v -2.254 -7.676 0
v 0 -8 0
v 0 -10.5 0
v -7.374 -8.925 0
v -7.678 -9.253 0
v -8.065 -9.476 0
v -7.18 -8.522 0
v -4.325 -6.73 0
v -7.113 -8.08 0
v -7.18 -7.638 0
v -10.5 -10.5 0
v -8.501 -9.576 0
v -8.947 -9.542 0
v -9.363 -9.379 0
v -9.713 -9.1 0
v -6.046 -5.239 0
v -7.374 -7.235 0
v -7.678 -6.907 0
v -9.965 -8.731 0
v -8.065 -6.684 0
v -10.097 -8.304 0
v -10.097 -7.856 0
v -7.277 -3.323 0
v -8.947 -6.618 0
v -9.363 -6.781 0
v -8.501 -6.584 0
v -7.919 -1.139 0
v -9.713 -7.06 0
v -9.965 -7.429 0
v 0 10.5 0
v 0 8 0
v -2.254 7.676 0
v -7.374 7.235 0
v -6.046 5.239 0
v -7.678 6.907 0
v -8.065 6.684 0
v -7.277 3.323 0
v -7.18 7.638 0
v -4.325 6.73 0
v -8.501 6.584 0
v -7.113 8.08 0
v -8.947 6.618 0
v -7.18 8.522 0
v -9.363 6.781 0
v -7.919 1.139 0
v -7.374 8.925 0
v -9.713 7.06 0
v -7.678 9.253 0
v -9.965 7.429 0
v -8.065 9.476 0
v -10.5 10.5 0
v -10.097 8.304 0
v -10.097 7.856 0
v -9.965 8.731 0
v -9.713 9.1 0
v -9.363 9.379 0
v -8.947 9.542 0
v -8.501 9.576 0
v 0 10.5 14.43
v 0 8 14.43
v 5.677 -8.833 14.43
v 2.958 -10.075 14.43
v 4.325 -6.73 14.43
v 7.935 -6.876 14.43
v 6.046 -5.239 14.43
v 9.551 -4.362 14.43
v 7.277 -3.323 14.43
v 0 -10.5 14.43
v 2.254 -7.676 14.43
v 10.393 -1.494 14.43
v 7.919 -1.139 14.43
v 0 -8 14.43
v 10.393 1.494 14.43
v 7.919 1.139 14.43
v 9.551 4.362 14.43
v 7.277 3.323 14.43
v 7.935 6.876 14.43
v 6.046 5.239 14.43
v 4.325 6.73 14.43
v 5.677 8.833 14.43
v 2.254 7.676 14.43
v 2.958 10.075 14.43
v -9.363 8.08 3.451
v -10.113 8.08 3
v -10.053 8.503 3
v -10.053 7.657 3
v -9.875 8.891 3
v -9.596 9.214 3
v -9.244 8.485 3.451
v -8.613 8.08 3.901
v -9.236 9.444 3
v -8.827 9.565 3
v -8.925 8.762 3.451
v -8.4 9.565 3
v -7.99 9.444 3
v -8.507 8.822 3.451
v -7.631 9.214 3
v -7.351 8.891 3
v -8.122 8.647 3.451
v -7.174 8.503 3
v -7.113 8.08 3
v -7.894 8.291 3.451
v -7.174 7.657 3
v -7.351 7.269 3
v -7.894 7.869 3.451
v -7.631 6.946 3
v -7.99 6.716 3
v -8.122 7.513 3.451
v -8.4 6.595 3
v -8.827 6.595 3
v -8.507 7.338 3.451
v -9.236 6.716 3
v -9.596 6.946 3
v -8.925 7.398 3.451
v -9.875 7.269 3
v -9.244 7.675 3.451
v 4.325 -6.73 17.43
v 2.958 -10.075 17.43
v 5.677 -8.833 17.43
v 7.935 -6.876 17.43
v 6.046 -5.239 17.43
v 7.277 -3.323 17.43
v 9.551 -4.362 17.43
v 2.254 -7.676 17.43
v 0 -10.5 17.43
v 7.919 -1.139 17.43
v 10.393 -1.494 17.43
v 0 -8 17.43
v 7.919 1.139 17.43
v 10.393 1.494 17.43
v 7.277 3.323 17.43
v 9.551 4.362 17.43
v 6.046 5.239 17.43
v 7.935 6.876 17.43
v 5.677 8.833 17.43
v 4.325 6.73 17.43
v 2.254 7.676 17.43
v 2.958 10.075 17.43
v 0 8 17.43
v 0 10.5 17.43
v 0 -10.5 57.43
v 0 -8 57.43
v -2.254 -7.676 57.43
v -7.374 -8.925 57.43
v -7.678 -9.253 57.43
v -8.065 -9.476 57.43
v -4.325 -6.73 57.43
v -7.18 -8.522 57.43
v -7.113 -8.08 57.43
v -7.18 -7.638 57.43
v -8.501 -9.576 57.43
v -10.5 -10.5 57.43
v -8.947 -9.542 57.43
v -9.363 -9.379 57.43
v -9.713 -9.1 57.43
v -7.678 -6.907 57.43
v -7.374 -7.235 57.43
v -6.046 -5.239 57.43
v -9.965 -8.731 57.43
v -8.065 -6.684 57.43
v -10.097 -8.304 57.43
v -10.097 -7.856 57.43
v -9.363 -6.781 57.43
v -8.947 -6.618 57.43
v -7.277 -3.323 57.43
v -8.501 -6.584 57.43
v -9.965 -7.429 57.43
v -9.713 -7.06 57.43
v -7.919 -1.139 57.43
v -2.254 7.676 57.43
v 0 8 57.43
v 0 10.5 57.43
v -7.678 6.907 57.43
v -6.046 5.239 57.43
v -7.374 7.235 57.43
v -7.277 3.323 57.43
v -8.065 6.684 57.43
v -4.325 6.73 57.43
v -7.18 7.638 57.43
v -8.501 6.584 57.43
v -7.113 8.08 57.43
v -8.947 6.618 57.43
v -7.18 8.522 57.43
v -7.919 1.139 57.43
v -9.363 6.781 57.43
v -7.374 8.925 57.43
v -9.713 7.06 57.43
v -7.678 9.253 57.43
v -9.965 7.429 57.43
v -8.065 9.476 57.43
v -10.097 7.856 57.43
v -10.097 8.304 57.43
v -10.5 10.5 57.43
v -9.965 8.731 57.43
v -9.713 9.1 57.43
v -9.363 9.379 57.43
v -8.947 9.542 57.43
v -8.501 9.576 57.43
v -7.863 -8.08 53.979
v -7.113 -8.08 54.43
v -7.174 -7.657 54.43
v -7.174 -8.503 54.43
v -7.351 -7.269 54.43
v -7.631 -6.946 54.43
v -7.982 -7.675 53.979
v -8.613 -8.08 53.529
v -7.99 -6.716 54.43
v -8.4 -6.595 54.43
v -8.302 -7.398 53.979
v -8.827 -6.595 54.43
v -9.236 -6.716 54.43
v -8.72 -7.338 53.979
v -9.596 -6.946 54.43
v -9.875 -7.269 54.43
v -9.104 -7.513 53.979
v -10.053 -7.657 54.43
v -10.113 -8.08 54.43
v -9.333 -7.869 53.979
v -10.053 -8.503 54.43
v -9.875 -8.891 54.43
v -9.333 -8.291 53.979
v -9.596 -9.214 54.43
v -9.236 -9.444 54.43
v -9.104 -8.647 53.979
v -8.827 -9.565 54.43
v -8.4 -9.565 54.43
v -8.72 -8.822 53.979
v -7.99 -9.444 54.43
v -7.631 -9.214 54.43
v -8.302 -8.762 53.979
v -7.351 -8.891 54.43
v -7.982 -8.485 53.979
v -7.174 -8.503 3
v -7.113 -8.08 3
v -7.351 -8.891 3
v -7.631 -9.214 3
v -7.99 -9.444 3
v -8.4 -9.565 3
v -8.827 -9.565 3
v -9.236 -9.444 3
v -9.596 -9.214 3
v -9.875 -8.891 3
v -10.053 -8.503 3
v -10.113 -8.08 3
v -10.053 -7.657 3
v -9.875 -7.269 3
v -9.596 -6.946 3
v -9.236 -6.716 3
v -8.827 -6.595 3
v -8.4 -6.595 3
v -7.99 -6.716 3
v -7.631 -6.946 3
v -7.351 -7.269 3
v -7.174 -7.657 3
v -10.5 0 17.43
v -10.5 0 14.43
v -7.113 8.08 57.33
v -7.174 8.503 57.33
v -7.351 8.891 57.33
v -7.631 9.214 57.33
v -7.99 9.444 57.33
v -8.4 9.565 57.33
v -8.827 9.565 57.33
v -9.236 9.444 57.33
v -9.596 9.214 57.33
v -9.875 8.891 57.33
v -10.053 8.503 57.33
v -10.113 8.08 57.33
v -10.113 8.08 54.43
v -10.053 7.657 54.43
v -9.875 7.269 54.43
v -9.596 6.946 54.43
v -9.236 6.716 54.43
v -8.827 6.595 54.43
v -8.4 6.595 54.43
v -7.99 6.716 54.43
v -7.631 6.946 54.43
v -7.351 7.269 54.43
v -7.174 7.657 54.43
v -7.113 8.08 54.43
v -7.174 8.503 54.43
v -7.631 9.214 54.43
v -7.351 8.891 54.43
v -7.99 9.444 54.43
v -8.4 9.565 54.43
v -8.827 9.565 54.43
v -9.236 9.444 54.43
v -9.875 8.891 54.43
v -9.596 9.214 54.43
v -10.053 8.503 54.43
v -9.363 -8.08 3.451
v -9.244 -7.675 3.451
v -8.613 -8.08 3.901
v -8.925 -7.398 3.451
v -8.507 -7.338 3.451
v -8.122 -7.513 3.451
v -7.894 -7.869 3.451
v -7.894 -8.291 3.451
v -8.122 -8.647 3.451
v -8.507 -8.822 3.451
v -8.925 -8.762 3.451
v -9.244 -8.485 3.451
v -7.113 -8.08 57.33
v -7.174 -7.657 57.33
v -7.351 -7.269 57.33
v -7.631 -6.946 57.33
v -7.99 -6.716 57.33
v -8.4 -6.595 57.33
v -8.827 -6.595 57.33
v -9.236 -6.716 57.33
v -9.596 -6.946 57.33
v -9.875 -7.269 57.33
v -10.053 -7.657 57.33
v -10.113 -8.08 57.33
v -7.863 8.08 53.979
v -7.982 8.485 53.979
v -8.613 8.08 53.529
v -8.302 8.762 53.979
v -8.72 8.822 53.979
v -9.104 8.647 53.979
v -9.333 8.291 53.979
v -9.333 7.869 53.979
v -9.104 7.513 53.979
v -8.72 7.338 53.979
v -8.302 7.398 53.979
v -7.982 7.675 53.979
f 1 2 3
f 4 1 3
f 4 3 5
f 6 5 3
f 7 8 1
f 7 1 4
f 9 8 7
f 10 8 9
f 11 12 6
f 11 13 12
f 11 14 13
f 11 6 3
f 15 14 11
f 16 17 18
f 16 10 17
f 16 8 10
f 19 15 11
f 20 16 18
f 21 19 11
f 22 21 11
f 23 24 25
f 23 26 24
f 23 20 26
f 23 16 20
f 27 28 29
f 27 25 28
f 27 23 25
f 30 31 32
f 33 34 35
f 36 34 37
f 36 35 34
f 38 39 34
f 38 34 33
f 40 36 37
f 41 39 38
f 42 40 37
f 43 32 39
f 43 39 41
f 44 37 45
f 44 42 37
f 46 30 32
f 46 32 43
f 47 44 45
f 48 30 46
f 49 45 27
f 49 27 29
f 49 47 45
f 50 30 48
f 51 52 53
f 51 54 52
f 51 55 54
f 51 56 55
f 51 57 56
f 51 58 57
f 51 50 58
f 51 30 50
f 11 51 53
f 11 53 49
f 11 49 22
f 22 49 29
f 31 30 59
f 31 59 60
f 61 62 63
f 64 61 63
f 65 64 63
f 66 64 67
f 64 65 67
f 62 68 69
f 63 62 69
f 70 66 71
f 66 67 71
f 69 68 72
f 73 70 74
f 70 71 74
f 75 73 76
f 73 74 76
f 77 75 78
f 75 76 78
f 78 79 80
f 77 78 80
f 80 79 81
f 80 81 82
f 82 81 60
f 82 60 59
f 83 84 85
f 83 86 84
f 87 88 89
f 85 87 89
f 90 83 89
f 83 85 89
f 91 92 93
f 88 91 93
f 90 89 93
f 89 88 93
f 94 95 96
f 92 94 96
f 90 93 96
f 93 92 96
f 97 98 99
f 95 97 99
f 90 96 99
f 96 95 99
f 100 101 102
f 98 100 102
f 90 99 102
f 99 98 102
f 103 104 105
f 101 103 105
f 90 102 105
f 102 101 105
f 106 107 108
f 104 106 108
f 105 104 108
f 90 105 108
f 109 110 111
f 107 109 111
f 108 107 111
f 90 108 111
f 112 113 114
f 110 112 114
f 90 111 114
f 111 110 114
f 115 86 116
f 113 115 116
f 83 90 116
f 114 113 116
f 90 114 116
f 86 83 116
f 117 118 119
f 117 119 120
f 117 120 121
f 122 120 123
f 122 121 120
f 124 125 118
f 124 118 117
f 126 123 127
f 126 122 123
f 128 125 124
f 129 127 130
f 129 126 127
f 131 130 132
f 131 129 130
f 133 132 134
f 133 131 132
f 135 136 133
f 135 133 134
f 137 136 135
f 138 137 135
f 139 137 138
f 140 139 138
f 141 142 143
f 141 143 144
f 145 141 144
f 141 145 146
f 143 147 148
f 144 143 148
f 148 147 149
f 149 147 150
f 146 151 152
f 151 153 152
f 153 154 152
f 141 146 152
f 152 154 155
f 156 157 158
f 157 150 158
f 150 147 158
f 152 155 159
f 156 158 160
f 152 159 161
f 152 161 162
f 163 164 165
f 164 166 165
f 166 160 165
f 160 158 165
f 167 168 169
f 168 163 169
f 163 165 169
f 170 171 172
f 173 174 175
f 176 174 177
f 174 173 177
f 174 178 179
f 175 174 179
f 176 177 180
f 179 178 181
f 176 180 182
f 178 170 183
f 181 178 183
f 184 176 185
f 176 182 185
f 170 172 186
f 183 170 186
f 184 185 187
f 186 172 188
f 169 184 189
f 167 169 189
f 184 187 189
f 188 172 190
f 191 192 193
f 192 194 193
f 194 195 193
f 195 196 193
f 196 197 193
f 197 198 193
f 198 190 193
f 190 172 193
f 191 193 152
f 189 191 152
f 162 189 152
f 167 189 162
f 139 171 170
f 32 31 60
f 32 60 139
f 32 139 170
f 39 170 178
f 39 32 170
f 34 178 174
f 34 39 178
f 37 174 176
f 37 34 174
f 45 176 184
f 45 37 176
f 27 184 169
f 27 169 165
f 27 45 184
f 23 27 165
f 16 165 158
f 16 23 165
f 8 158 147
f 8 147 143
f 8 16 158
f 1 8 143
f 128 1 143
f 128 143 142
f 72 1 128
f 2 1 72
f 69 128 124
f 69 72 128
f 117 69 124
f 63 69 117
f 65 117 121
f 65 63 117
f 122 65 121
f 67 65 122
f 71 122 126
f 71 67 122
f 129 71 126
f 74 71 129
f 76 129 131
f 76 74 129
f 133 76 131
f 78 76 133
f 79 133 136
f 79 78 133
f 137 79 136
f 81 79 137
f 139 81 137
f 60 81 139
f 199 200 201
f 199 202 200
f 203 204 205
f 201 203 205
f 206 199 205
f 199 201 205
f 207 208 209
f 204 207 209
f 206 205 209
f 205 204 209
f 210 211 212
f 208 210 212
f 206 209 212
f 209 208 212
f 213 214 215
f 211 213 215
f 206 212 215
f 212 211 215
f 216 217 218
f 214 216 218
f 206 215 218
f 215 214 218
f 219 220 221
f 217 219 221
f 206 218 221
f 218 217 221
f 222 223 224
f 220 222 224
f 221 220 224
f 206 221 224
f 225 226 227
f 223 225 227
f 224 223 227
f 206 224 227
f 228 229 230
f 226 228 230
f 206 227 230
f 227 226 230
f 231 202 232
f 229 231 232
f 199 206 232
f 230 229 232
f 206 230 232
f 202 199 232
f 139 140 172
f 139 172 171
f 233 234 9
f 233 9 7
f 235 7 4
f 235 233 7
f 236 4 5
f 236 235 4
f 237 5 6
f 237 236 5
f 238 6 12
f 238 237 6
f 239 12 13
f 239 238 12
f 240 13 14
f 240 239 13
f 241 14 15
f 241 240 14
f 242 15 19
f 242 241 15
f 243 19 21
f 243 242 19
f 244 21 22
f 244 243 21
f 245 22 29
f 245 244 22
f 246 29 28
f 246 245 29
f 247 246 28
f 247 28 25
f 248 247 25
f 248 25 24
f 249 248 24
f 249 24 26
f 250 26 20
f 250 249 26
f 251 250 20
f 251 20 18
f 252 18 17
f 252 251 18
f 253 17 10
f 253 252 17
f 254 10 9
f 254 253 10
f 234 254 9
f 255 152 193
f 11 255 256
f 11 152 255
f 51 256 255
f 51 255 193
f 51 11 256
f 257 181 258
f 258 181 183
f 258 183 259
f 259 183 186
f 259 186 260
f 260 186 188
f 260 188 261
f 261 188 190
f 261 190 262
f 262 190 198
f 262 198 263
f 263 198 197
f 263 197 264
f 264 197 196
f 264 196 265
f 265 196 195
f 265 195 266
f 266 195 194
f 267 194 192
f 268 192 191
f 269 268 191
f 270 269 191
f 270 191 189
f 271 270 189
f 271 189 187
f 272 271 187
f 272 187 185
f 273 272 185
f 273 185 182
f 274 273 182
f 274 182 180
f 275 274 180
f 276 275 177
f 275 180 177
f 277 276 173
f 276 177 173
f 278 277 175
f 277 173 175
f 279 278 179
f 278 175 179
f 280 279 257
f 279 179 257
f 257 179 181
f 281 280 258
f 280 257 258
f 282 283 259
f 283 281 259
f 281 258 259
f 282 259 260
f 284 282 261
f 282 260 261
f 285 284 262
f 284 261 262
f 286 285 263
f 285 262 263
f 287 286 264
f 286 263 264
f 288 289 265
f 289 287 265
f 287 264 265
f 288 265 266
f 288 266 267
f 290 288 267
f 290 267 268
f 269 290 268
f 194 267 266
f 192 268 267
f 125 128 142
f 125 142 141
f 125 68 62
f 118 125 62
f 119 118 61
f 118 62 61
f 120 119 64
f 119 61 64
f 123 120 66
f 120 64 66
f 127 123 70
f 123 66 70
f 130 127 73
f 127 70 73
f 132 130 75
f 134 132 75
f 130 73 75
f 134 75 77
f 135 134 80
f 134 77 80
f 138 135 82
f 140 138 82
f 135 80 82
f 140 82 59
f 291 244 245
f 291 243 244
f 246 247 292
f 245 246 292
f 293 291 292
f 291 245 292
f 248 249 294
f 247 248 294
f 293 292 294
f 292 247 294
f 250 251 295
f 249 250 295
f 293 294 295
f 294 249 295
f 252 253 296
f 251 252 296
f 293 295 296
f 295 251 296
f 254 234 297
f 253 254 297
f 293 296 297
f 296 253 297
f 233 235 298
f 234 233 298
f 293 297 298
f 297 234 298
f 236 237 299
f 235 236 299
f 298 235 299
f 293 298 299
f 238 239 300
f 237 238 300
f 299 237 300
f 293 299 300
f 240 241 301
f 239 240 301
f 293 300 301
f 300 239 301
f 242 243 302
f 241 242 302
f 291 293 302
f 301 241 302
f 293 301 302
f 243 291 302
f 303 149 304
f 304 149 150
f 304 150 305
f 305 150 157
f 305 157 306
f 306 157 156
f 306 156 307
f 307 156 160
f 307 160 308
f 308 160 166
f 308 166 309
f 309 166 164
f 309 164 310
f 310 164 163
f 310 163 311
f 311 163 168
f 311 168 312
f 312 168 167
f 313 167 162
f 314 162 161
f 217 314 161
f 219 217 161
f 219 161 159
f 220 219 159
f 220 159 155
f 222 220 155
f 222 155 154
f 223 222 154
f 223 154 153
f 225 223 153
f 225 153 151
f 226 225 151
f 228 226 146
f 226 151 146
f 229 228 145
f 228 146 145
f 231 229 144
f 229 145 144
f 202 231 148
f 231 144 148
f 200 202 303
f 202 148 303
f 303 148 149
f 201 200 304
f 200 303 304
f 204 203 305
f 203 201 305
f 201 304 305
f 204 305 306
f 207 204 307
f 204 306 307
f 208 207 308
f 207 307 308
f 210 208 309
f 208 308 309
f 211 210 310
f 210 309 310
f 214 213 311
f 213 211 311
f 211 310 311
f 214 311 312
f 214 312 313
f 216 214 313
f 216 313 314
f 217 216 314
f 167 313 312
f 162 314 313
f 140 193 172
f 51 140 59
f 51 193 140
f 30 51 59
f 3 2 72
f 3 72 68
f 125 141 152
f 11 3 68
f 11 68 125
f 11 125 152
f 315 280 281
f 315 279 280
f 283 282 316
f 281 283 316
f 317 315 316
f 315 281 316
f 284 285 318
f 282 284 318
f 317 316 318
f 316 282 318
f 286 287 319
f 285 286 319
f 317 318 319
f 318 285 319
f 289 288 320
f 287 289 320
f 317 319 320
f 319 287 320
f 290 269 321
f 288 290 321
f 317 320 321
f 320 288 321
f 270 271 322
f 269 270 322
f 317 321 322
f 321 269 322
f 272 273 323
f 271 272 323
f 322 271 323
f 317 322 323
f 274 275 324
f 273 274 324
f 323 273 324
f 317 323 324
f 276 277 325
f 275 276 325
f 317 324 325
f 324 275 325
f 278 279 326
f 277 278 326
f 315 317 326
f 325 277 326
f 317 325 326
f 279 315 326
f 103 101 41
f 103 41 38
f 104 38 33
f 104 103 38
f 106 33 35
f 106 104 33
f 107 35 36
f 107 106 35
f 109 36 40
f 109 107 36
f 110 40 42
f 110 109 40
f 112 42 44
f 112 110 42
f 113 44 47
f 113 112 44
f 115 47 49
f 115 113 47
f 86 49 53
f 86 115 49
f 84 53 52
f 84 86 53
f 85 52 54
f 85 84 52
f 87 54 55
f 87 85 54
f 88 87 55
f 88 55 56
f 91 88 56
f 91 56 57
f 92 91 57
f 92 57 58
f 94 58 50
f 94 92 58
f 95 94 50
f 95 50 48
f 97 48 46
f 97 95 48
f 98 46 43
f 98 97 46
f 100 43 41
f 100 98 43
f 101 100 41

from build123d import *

# Parameters (mm, degrees)
BOSS_EXTRUDE1_DEPTH       = 57.43
SKETCH2_W                 = 3
SKETCH2_H                 = 2.5
SKETCH6_R                 = 1.5
CUT_EXTRUDE1_DEPTH        = 0.1
CUT_EXTRUDE2_START        = -0.1
SKETCH9_R                 = 1.5
CUT_EXTRUDE2_DEPTH        = 0.1
F_3_0MM_DOWEL_HOLE1_D     = 3
F_3_0MM_DOWEL_HOLE1_DEPTH = 3
F_3_0MM_DOWEL_HOLE1_TIP   = 0.901290929
F_3_0MM_DOWEL_HOLE2_D     = 3
F_3_0MM_DOWEL_HOLE2_DEPTH = 3
F_3_0MM_DOWEL_HOLE2_TIP   = 0.901290929


with BuildPart() as part:
    # Sketch1 → Boss-Extrude1 (new body)
    with BuildSketch(Plane.XY):
        with BuildLine():
            Line((0, -8), (0, -10.5))
            Line((0, -10.5), (-10.5, -10.5))
            Line((-10.5, -10.5), (-10.5, 10.5))
            Line((-10.5, 10.5), (0, 10.5))
            Line((0, 10.5), (0, 8))
            ThreePointArc((0, 8), (-8, 0), (0, -8))
        make_face()
    extrude(amount=BOSS_EXTRUDE1_DEPTH)

    # Sketch2 → Revolve1 (revolve)
    with BuildSketch(Plane(origin=(0, 0, 0), x_dir=(0, 0, -1), z_dir=(1, 0, 0)), mode=Mode.PRIVATE) as revolve1_sk:
        with Locations((-15.93, -9.25)):
            Rectangle(SKETCH2_W, SKETCH2_H)
    revolve(revolve1_sk.sketch.rotate(Axis((0, 0, 0), (0, 0, 1)), 180), axis=Axis((0, 0, 0), (0, 0, 1)))

    # Sketch6 → Cut-Extrude1 (cut)
    with BuildSketch(Plane.XY.offset(57.43)):
        with Locations((-8.613344298, 8.08)):
            Circle(SKETCH6_R)
        with Locations((-8.613344298, -8.08)):
            Circle(SKETCH6_R)
    extrude(amount=-CUT_EXTRUDE1_DEPTH, mode=Mode.SUBTRACT)

    # Sketch9 → Cut-Extrude2 (cut)
    with BuildSketch(Plane(origin=(0, 0, 0), x_dir=(-1, 0, 0), z_dir=(0, 0, -1)).offset(CUT_EXTRUDE2_START)):
        with Locations(Location((8.613344298, 8.08, 0), (0, 0, 180))):
            Circle(SKETCH9_R)
        with Locations(Location((8.613344298, -8.08, 0), (0, 0, 180))):
            Circle(SKETCH9_R)
    extrude(amount=CUT_EXTRUDE2_DEPTH, mode=Mode.SUBTRACT)

    # Ø3.0mm Dowel Hole1
    with Locations(Plane.XY.offset(57.43)):
        with Locations((-8.613344298, 8.08), (-8.613344298, -8.08)):
            Hole(F_3_0MM_DOWEL_HOLE1_D / 2, depth=F_3_0MM_DOWEL_HOLE1_DEPTH)
            with Locations((0, 0, -(F_3_0MM_DOWEL_HOLE1_DEPTH + F_3_0MM_DOWEL_HOLE1_TIP / 2))):  # 118° drill point
                Cone(0, F_3_0MM_DOWEL_HOLE1_D / 2, F_3_0MM_DOWEL_HOLE1_TIP, mode=Mode.SUBTRACT)

    # Ø3.0mm Dowel Hole2
    with Locations(Plane(origin=(0, 0, 0), x_dir=(-1, 0, 0), z_dir=(0, 0, -1))):
        with Locations((8.613344298, 8.08), (8.613344298, -8.08)):
            Hole(F_3_0MM_DOWEL_HOLE2_D / 2, depth=F_3_0MM_DOWEL_HOLE2_DEPTH)
            with Locations((0, 0, -(F_3_0MM_DOWEL_HOLE2_DEPTH + F_3_0MM_DOWEL_HOLE2_TIP / 2))):  # 118° drill point
                Cone(0, F_3_0MM_DOWEL_HOLE2_D / 2, F_3_0MM_DOWEL_HOLE2_TIP, mode=Mode.SUBTRACT)


solid = part.part
